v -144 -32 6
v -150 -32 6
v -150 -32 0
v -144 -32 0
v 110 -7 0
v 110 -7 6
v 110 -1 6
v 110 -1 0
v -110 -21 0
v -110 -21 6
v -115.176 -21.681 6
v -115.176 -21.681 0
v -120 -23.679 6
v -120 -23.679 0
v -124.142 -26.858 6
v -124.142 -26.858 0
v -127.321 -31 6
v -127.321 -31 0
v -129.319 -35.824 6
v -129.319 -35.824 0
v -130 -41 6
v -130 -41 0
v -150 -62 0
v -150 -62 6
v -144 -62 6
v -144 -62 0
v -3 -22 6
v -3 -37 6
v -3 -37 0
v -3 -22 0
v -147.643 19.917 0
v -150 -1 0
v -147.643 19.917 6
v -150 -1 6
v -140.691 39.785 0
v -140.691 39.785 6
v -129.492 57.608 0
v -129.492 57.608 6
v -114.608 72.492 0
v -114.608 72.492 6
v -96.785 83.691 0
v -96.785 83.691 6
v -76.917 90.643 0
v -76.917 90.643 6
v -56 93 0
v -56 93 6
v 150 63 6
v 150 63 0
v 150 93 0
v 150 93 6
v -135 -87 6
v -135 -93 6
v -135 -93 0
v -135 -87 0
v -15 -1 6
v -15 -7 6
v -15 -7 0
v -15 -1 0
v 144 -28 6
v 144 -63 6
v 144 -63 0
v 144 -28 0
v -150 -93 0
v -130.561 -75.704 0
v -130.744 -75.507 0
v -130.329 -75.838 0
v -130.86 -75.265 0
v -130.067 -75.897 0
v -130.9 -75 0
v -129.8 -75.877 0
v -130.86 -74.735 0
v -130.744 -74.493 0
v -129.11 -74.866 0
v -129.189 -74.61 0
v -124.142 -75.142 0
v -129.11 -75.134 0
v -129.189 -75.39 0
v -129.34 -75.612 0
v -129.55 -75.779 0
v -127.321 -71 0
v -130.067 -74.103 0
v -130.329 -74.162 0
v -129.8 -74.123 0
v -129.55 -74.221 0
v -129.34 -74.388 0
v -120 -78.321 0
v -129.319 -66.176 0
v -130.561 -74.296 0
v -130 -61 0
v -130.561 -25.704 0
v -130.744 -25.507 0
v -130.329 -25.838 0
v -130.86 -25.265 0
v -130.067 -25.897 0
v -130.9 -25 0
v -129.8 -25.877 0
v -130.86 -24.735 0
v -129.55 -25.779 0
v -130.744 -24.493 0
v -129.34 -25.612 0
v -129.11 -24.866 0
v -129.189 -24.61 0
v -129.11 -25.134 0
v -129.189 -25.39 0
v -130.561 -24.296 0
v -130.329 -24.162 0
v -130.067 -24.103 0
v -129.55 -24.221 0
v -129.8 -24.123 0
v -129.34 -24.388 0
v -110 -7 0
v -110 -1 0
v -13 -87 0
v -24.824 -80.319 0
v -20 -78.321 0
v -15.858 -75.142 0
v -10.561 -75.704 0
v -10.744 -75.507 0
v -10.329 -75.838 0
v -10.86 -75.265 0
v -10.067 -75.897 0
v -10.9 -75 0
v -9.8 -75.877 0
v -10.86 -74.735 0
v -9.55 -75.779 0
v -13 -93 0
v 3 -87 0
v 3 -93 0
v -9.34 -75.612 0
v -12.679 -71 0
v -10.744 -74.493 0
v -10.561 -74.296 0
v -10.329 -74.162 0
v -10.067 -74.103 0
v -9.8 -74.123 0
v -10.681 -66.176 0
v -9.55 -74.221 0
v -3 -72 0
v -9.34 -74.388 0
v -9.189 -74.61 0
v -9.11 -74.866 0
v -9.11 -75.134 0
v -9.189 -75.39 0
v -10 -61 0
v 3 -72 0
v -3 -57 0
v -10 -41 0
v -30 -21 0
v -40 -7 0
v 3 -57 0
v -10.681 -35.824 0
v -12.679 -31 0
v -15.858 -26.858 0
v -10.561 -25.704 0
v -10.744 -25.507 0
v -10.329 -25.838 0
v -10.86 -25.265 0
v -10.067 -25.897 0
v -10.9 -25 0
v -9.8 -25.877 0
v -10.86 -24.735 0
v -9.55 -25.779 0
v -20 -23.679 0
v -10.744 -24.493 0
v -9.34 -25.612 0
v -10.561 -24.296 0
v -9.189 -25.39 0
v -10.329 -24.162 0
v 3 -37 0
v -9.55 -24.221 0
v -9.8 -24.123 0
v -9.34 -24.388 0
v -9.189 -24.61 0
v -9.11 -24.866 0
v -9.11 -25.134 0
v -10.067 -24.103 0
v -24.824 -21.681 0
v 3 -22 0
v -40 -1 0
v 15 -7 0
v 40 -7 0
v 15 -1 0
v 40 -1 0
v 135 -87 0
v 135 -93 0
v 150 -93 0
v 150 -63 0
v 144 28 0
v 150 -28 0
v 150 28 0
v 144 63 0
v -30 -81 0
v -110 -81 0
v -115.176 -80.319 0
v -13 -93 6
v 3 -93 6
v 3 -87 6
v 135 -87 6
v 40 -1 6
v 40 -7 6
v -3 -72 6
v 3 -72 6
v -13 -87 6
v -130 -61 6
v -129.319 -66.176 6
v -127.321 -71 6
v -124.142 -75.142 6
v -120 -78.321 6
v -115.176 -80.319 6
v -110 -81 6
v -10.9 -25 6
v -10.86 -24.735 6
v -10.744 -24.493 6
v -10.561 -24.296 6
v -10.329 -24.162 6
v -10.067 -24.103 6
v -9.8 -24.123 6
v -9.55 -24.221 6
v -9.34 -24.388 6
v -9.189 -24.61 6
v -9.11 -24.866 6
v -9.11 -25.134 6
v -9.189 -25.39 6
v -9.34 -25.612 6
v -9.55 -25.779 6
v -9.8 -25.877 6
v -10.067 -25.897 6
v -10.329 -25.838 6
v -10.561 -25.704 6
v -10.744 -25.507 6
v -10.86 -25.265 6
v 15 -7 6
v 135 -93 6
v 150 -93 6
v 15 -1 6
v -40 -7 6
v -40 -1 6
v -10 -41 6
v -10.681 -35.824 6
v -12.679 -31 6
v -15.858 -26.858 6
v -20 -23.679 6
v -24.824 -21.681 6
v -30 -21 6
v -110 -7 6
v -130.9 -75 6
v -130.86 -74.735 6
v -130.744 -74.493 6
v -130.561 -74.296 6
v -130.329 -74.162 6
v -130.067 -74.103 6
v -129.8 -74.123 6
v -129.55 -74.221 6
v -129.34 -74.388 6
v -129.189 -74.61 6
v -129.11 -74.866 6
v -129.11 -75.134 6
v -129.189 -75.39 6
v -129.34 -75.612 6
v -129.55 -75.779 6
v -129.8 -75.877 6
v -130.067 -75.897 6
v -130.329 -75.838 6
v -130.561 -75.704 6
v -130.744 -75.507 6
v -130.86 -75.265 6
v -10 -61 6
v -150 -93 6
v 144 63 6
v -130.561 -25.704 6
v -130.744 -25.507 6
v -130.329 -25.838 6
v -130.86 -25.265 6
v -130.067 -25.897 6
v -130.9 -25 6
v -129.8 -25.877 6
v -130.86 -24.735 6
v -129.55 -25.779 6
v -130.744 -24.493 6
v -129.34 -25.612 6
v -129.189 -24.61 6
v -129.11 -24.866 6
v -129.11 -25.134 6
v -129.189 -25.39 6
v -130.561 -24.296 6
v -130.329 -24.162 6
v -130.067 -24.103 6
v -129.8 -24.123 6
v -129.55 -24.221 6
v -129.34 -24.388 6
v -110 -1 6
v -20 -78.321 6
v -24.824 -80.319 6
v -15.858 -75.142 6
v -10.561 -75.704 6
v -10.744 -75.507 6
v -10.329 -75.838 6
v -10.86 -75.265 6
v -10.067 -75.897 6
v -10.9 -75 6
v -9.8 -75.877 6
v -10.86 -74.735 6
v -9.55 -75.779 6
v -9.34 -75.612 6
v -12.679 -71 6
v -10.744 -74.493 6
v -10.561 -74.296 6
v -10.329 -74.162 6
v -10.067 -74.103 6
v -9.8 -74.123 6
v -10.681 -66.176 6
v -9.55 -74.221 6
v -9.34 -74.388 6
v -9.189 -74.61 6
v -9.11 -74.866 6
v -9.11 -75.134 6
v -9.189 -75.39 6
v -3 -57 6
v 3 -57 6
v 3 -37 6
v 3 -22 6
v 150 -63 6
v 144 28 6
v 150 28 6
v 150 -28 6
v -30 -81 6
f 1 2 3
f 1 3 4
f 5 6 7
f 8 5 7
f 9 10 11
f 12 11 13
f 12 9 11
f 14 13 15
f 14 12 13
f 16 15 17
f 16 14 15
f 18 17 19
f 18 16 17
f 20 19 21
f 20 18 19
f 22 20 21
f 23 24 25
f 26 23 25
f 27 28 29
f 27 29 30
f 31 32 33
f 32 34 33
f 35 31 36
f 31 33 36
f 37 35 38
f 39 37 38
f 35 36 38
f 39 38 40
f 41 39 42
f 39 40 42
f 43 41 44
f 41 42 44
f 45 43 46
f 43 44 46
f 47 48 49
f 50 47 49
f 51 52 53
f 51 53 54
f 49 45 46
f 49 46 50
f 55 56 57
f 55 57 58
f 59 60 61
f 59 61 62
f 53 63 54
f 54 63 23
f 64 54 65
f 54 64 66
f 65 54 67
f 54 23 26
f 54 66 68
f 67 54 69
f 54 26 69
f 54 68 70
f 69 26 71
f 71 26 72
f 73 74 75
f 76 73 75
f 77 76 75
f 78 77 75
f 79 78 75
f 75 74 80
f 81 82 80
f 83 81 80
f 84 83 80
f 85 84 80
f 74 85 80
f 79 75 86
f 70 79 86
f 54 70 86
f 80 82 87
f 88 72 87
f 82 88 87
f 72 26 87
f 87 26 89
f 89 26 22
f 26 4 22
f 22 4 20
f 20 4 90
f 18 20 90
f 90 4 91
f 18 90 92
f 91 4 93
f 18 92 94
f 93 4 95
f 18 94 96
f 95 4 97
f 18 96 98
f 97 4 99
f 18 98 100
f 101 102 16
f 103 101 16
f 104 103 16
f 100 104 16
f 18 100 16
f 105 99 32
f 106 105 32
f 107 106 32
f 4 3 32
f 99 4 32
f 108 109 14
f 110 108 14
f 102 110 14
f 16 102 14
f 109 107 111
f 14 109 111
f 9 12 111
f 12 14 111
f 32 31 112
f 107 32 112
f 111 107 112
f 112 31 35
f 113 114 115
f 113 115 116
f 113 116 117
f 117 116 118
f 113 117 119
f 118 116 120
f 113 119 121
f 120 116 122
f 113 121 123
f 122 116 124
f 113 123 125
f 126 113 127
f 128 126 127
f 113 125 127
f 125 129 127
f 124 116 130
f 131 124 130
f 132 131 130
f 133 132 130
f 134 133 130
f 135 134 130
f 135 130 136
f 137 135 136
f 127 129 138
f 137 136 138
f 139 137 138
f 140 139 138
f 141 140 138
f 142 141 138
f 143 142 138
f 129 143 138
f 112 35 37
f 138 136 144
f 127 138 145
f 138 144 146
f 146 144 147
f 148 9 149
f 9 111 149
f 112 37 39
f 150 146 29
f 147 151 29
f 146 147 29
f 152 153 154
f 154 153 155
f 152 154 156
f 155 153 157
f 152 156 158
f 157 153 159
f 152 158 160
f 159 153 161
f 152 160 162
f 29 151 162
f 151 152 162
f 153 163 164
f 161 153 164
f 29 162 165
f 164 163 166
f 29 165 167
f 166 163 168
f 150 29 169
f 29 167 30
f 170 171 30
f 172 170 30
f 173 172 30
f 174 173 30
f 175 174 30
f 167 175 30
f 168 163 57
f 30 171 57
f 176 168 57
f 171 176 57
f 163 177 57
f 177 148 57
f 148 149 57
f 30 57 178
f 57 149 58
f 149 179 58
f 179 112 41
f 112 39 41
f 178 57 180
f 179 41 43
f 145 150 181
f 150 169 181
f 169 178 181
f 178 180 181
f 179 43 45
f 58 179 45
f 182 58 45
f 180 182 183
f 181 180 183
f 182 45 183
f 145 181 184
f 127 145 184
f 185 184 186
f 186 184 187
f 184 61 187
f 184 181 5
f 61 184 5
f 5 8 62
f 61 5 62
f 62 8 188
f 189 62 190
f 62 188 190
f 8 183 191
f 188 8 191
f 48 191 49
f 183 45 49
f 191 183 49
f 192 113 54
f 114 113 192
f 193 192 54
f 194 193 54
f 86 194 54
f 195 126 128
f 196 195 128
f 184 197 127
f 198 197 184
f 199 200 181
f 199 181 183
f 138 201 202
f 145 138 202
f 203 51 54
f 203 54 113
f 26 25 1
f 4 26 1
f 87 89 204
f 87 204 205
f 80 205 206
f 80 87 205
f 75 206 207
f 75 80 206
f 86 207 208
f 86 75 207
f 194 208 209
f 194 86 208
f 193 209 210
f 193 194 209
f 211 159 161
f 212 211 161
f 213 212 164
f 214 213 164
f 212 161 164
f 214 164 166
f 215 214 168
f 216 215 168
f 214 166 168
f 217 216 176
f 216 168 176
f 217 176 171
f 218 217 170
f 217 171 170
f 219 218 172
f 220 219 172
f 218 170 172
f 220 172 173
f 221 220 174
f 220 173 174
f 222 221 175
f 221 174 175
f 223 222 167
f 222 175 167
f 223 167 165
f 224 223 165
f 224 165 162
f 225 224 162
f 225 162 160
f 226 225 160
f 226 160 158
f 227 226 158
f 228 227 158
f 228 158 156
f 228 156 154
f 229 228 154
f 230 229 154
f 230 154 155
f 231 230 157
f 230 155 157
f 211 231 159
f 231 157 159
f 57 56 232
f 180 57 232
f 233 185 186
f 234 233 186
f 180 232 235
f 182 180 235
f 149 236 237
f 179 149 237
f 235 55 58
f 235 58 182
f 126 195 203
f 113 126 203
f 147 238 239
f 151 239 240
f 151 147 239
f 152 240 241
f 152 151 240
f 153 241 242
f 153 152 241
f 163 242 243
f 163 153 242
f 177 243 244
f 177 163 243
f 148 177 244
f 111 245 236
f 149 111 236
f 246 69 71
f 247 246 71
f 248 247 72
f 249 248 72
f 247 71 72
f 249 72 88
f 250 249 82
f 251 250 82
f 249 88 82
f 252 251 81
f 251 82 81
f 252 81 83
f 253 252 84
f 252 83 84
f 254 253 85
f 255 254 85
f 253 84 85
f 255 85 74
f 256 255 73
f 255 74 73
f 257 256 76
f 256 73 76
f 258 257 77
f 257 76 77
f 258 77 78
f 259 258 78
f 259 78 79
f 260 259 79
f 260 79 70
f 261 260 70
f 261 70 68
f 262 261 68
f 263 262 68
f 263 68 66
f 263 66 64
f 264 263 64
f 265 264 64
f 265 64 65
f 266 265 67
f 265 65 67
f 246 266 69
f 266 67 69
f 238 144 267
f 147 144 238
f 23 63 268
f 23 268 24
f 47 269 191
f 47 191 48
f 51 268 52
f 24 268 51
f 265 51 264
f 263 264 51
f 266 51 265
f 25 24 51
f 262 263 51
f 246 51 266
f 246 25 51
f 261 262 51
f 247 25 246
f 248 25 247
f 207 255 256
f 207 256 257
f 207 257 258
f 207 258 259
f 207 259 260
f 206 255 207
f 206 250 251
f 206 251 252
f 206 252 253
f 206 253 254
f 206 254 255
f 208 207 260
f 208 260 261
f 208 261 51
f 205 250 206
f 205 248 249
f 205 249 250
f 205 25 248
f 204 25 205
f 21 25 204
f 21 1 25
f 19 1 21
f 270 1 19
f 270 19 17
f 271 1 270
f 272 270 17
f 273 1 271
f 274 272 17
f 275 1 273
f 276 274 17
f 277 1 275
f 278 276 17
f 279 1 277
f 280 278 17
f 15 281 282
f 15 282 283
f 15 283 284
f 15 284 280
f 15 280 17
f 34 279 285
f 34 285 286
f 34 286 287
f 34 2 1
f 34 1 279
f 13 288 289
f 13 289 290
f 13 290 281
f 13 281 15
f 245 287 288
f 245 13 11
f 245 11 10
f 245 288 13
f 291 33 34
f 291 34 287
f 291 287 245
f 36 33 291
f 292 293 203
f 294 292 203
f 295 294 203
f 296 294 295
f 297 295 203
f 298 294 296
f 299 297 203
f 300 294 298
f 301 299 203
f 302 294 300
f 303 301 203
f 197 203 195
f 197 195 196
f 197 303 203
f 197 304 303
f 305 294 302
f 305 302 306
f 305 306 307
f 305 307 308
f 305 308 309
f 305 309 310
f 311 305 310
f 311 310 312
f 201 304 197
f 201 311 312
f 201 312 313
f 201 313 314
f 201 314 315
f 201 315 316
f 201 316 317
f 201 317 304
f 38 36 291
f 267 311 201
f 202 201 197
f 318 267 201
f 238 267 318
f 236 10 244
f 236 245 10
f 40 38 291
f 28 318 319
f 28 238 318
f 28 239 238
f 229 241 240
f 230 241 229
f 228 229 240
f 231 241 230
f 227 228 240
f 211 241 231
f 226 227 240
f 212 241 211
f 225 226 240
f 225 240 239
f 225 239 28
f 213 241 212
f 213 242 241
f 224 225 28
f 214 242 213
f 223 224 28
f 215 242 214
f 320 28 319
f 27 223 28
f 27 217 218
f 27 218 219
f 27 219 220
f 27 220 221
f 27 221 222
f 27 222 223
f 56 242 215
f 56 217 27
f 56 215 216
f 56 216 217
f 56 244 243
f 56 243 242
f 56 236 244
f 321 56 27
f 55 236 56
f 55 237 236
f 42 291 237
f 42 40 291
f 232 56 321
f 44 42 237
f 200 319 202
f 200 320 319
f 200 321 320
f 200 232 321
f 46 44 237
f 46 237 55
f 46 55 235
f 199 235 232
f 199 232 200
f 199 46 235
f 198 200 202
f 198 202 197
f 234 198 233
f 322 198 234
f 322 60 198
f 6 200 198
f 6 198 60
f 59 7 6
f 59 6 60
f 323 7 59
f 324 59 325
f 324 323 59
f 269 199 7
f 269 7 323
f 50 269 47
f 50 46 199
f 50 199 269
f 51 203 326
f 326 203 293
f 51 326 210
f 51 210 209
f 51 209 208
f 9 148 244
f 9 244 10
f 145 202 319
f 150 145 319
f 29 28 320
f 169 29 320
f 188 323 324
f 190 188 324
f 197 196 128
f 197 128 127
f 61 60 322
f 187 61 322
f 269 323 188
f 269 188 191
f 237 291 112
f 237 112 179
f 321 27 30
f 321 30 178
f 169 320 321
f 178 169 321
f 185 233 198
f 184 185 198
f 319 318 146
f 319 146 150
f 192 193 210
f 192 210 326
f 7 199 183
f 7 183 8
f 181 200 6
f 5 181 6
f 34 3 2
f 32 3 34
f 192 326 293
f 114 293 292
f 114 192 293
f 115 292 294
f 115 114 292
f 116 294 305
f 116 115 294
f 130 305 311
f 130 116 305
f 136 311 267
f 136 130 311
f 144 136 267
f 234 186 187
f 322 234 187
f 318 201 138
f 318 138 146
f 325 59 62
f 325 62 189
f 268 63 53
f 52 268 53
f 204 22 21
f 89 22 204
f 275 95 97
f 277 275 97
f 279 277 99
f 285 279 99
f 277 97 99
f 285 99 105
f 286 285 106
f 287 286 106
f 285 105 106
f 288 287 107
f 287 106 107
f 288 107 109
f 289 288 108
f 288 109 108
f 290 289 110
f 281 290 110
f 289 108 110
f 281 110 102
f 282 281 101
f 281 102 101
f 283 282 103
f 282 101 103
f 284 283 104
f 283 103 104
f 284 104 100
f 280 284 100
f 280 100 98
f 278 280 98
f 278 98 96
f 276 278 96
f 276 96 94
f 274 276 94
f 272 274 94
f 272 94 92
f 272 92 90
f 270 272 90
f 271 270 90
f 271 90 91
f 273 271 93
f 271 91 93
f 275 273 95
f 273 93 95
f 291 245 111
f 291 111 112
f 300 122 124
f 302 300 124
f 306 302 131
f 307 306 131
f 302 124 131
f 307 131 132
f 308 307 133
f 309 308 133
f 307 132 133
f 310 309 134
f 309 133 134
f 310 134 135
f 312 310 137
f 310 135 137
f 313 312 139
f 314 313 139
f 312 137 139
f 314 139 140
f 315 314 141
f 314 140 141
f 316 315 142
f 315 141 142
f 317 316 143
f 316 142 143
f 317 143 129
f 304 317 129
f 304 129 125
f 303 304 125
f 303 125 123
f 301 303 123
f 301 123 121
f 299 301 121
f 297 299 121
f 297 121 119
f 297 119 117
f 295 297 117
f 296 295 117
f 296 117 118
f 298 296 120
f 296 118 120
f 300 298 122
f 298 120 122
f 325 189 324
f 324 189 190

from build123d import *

# Parameters (mm, degrees)
SKETCH1_W           = 300
SKETCH1_H           = 186
BOSS_EXTRUDE1_DEPTH = 6
FILLET1_R           = 94
CUT_EXTRUDE1_DEPTH  = 10
SKETCH3_W           = 70
SKETCH3_H           = 6
SKETCH3_W_2         = 6
SKETCH3_H_2         = 30
SKETCH3_W_3         = 122
SKETCH3_H_3         = 35
SKETCH3_W_4         = 30
SKETCH3_H_4         = 15
SKETCH3_W_5         = 132
CUT_EXTRUDE2_DEPTH  = 6
SKETCH4_R           = 0.9
CUT_EXTRUDE3_DEPTH  = 6


with BuildPart() as part:
    # Sketch1 → Boss-Extrude1 (new body)
    with BuildSketch(Plane.XY):
        Rectangle(SKETCH1_W, SKETCH1_H)
    extrude(amount=BOSS_EXTRUDE1_DEPTH)

    # Fillet1
    fillet1_edges = [part.edges().sort_by_distance(p)[0] for p in [
        (-150, 93, 3),
    ]]
    fillet(fillet1_edges, radius=FILLET1_R)

    # Sketch2 → Cut-Extrude1 (cut)
    with BuildSketch(Plane(origin=(0, 0, 0), x_dir=(-1, 0, 0), z_dir=(0, 0, -1))):
        with BuildLine():
            Line((110, -81), (30, -81))
            ThreePointArc((30, -81), (15.857864376, -75.142135624), (10, -61))
            Line((10, -61), (10, -41))
            ThreePointArc((10, -41), (15.857864376, -26.857864376), (30, -21))
            Line((30, -21), (110, -21))
            ThreePointArc((110, -21), (124.142135624, -26.857864376), (130, -41))
            Line((130, -41), (130, -61))
            ThreePointArc((130, -61), (124.142135624, -75.142135624), (110, -81))
        make_face()
    extrude(amount=-CUT_EXTRUDE1_DEPTH, mode=Mode.SUBTRACT)

    # Sketch3 → Cut-Extrude2 (cut)
    with BuildSketch(Plane.XY.offset(6)):
        with Locations((-75, -4)):
            Rectangle(SKETCH3_W, SKETCH3_H)
        with Locations((-147, -47)):
            Rectangle(SKETCH3_W_2, SKETCH3_H_2)
        with Locations((-74, -90)):
            Rectangle(SKETCH3_W_3, SKETCH3_H)
        with Locations((147, 45.5)):
            Rectangle(SKETCH3_W_2, SKETCH3_H_3)
        with Locations((147, -45.5)):
            Rectangle(SKETCH3_W_2, SKETCH3_H_3)
        with Locations((75, -4)):
            Rectangle(SKETCH3_W, SKETCH3_H)
        with Locations((0, -4)):
            Rectangle(SKETCH3_W_4, SKETCH3_H)
        with Locations((0, -29.5)):
            Rectangle(SKETCH3_W_2, SKETCH3_H_4)
        with Locations((0, -64.5)):
            Rectangle(SKETCH3_W_2, SKETCH3_H_4)
        with Locations((69, -90)):
            Rectangle(SKETCH3_W_5, SKETCH3_H)
    extrude(amount=-CUT_EXTRUDE2_DEPTH, mode=Mode.SUBTRACT)

    # Sketch4 → Cut-Extrude3 (cut)
    with BuildSketch(Plane(origin=(0, 0, 0), x_dir=(-1, 0, 0), z_dir=(0, 0, -1))):
        with Locations((130, -75)):
            Circle(SKETCH4_R)
        with Locations((130, -25)):
            Circle(SKETCH4_R)
        with Locations((10, -75)):
            Circle(SKETCH4_R)
        with Locations((10, -25)):
            Circle(SKETCH4_R)
    extrude(amount=-CUT_EXTRUDE3_DEPTH, mode=Mode.SUBTRACT)


solid = part.part
